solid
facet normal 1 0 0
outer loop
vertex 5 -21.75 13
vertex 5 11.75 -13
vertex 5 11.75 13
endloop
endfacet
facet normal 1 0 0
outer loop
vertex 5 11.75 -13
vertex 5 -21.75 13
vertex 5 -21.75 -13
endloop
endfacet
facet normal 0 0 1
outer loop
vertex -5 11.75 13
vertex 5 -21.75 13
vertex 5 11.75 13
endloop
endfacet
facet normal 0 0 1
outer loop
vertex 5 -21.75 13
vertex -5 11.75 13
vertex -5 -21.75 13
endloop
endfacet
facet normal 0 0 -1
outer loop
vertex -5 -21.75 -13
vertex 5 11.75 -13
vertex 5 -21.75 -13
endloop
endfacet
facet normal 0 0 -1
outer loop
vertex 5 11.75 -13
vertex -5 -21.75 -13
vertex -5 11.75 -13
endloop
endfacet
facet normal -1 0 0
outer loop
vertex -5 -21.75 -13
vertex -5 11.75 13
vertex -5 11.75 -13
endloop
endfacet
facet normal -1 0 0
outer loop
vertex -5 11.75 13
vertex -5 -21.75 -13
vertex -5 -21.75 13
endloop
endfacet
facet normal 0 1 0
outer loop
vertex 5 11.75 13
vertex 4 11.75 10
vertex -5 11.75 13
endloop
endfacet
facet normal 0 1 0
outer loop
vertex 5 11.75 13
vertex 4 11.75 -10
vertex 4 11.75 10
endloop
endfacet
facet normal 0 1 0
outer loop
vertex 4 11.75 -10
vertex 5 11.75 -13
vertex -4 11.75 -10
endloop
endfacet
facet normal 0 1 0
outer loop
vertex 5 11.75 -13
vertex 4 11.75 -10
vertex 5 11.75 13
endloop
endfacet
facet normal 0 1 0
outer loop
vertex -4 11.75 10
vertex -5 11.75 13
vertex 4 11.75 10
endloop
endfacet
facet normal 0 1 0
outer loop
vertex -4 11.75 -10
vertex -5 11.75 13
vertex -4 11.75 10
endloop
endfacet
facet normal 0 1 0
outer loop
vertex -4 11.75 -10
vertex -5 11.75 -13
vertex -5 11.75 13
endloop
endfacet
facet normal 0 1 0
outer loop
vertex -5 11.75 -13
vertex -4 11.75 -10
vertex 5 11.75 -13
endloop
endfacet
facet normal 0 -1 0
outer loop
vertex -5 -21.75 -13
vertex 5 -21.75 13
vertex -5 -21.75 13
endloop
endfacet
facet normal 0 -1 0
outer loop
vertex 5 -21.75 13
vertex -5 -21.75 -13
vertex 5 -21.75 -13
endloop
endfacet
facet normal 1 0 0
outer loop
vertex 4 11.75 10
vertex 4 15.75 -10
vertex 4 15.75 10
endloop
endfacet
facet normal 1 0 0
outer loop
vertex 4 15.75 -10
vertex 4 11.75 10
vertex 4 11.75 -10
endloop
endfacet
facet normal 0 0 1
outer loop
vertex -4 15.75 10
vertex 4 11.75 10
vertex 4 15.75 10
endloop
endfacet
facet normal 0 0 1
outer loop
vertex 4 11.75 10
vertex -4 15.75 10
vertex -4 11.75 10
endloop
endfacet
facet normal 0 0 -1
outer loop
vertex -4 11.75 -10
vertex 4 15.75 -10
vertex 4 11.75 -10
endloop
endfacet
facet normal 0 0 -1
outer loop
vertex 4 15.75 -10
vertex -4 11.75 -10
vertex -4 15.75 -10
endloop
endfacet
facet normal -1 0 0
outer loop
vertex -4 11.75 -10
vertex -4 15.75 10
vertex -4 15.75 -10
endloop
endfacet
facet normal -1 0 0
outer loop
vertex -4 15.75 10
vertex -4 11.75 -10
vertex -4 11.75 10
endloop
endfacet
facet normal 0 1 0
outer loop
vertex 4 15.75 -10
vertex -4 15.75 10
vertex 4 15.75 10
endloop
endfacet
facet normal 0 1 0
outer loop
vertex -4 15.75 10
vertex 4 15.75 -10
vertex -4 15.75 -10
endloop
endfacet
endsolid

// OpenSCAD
$fn=96;

bbox_x = 10.0;
bbox_y = 43.5;
bbox_z = 26.0;

body_y = 33.5;
shoulder_y = 4.0;
peg_y = bbox_y - body_y - shoulder_y;

body_x = bbox_x;
body_z = bbox_z;

shoulder_x = 8.0;
shoulder_z = 20.0;

peg_x = 6.0;
peg_z = 14.0;

module obround_prism(x, z, y) {
    r = min(x, z)/2;
    linear_extrude(height=y, center=false, convexity=10)
        hull() {
            translate([ x/2 - r, 0]) circle(r=r);
            translate([-x/2 + r, 0]) circle(r=r);
        }
}

module main_body() {
    translate([0, -bbox_y/2 + body_y/2, 0])
        cube([body_x, body_y, body_z], center=true);
}

module shoulder() {
    translate([0, -bbox_y/2 + body_y + shoulder_y/2, 0])
        cube([shoulder_x, shoulder_y, shoulder_z], center=true);
}

module peg() {
    translate([0, -bbox_y/2 + body_y + shoulder_y, 0])
        translate([0, 0, 0])
            translate([0, 0, 0])
                translate([0, 0, 0])
                    translate([0, 0, 0])
                        translate([0, 0, 0])
                            translate([0, 0, 0])
                                translate([0, 0, 0])
                                    translate([0, 0, 0])
                                        translate([0, 0, 0])
                                            translate([0, 0, 0])
                                                translate([0, 0, 0])
                                                    translate([0, 0, 0])
                                                        translate([0, 0, 0])
                                                            translate([0, 0, 0])
                                                                translate([0, 0, 0])
                                                                    translate([0, 0, 0])
                                                                        translate([0, 0, 0])
                                                                            translate([0, 0, 0])
                                                                                translate([0, 0, 0])
                                                                                    translate([0, 0, 0])
                                                                                        translate([0, 0, 0])
                                                                                            translate([0, 0, 0])
                                                                                                translate([0, 0, 0])
                                                                                                    translate([0, 0, 0])
                                                                                                        translate([0, 0, 0])
                                                                                                            translate([0, 0, 0])
                                                                                                                translate([0, 0, 0])
                                                                                                                    translate([0, 0, 0])
                                                                                                                        translate([0, 0, 0])
                                                                                                                            translate([0, 0, 0])
                                                                                                                                translate([0, 0, 0])
                                                                                                                                    translate([0, 0, 0])
                                                                                                                                        translate([0, 0, 0])
                                                                                                                                            translate([0, 0, 0])
                                                                                                                                                translate([0, 0, 0])
                                                                                                                                                    translate([0, 0, 0])
                                                                                                                                                        translate([0, 0, 0])
                                                                                                                                                            translate([0, 0, 0])
                                                                                                                                                                translate([0, 0, 0])
                                                                                                                                                                    translate([0, 0, 0])
                                                                                                                                                                        translate([0, 0, 0])
                                                                                                                                                                            translate([0, 0, 0])
                                                                                                                                                                                translate([0, 0, 0])
                                                                                                                                                                                    translate([0, 0, 0])
                                                                                                                                                                                        translate([0, 0, 0])
                                                                                                                                                                                            translate([0, 0, 0])
                                                                                                                                                                                                translate([0, 0, 0])
                                                                                                                                                                                                    translate([0, 0, 0])
                                                                                                                                                                                                        translate([0, 0, 0])
                                                                                                                                                                                                            translate([0, 0, 0])
                                                                                                                                                                                                                translate([0, 0, 0])
                                                                                                                                                                                                                    translate([0, 0, 0])
                                                                                                                                                                                                                        translate([0, 0, 0])
                                                                                                                                                                                                                            translate([0, 0, 0])
                                                                                                                                                                                                                                translate([0, 0, 0])
                                                                                                                                                                                                                                    translate([0, 0, 0])
                                                                                                                                                                                                                                        translate([0, 0, 0])
                                                                                                                                                                                                                                            translate([0, 0, 0])
                                                                                                                                                                                                                                                translate([0, 0, 0])
                                                                                                                                                                                                                                                    translate([0, 0, 0])
                                                                                                                                                                                                                                                        translate([0, 0, 0])
                                                                                                                                                                                                                                                            translate([0, 0, 0])
                                                                                                                                                                                                                                                                translate([0, 0, 0])
                                                                                                                                                                                                                                                                    translate([0, 0, 0])
                                                                                                                                                                                                                                                                        translate([0, 0, 0])
                                                                                                                                                                                                                                                                            translate([0, 0, 0])
                                                                                                                                                                                                                                                                                translate([0, 0, 0])
                                                                                                                                                                                                                                                                                    translate([0, 0, 0])
                                                                                                                                                                                                                                                                                        rotate([90,0,0])
                                                                                                                                                                                                                                                                                            obround_prism(peg_x, peg_z, peg_y);
}

union() {
    main_body();
    shoulder();
    peg();
}
